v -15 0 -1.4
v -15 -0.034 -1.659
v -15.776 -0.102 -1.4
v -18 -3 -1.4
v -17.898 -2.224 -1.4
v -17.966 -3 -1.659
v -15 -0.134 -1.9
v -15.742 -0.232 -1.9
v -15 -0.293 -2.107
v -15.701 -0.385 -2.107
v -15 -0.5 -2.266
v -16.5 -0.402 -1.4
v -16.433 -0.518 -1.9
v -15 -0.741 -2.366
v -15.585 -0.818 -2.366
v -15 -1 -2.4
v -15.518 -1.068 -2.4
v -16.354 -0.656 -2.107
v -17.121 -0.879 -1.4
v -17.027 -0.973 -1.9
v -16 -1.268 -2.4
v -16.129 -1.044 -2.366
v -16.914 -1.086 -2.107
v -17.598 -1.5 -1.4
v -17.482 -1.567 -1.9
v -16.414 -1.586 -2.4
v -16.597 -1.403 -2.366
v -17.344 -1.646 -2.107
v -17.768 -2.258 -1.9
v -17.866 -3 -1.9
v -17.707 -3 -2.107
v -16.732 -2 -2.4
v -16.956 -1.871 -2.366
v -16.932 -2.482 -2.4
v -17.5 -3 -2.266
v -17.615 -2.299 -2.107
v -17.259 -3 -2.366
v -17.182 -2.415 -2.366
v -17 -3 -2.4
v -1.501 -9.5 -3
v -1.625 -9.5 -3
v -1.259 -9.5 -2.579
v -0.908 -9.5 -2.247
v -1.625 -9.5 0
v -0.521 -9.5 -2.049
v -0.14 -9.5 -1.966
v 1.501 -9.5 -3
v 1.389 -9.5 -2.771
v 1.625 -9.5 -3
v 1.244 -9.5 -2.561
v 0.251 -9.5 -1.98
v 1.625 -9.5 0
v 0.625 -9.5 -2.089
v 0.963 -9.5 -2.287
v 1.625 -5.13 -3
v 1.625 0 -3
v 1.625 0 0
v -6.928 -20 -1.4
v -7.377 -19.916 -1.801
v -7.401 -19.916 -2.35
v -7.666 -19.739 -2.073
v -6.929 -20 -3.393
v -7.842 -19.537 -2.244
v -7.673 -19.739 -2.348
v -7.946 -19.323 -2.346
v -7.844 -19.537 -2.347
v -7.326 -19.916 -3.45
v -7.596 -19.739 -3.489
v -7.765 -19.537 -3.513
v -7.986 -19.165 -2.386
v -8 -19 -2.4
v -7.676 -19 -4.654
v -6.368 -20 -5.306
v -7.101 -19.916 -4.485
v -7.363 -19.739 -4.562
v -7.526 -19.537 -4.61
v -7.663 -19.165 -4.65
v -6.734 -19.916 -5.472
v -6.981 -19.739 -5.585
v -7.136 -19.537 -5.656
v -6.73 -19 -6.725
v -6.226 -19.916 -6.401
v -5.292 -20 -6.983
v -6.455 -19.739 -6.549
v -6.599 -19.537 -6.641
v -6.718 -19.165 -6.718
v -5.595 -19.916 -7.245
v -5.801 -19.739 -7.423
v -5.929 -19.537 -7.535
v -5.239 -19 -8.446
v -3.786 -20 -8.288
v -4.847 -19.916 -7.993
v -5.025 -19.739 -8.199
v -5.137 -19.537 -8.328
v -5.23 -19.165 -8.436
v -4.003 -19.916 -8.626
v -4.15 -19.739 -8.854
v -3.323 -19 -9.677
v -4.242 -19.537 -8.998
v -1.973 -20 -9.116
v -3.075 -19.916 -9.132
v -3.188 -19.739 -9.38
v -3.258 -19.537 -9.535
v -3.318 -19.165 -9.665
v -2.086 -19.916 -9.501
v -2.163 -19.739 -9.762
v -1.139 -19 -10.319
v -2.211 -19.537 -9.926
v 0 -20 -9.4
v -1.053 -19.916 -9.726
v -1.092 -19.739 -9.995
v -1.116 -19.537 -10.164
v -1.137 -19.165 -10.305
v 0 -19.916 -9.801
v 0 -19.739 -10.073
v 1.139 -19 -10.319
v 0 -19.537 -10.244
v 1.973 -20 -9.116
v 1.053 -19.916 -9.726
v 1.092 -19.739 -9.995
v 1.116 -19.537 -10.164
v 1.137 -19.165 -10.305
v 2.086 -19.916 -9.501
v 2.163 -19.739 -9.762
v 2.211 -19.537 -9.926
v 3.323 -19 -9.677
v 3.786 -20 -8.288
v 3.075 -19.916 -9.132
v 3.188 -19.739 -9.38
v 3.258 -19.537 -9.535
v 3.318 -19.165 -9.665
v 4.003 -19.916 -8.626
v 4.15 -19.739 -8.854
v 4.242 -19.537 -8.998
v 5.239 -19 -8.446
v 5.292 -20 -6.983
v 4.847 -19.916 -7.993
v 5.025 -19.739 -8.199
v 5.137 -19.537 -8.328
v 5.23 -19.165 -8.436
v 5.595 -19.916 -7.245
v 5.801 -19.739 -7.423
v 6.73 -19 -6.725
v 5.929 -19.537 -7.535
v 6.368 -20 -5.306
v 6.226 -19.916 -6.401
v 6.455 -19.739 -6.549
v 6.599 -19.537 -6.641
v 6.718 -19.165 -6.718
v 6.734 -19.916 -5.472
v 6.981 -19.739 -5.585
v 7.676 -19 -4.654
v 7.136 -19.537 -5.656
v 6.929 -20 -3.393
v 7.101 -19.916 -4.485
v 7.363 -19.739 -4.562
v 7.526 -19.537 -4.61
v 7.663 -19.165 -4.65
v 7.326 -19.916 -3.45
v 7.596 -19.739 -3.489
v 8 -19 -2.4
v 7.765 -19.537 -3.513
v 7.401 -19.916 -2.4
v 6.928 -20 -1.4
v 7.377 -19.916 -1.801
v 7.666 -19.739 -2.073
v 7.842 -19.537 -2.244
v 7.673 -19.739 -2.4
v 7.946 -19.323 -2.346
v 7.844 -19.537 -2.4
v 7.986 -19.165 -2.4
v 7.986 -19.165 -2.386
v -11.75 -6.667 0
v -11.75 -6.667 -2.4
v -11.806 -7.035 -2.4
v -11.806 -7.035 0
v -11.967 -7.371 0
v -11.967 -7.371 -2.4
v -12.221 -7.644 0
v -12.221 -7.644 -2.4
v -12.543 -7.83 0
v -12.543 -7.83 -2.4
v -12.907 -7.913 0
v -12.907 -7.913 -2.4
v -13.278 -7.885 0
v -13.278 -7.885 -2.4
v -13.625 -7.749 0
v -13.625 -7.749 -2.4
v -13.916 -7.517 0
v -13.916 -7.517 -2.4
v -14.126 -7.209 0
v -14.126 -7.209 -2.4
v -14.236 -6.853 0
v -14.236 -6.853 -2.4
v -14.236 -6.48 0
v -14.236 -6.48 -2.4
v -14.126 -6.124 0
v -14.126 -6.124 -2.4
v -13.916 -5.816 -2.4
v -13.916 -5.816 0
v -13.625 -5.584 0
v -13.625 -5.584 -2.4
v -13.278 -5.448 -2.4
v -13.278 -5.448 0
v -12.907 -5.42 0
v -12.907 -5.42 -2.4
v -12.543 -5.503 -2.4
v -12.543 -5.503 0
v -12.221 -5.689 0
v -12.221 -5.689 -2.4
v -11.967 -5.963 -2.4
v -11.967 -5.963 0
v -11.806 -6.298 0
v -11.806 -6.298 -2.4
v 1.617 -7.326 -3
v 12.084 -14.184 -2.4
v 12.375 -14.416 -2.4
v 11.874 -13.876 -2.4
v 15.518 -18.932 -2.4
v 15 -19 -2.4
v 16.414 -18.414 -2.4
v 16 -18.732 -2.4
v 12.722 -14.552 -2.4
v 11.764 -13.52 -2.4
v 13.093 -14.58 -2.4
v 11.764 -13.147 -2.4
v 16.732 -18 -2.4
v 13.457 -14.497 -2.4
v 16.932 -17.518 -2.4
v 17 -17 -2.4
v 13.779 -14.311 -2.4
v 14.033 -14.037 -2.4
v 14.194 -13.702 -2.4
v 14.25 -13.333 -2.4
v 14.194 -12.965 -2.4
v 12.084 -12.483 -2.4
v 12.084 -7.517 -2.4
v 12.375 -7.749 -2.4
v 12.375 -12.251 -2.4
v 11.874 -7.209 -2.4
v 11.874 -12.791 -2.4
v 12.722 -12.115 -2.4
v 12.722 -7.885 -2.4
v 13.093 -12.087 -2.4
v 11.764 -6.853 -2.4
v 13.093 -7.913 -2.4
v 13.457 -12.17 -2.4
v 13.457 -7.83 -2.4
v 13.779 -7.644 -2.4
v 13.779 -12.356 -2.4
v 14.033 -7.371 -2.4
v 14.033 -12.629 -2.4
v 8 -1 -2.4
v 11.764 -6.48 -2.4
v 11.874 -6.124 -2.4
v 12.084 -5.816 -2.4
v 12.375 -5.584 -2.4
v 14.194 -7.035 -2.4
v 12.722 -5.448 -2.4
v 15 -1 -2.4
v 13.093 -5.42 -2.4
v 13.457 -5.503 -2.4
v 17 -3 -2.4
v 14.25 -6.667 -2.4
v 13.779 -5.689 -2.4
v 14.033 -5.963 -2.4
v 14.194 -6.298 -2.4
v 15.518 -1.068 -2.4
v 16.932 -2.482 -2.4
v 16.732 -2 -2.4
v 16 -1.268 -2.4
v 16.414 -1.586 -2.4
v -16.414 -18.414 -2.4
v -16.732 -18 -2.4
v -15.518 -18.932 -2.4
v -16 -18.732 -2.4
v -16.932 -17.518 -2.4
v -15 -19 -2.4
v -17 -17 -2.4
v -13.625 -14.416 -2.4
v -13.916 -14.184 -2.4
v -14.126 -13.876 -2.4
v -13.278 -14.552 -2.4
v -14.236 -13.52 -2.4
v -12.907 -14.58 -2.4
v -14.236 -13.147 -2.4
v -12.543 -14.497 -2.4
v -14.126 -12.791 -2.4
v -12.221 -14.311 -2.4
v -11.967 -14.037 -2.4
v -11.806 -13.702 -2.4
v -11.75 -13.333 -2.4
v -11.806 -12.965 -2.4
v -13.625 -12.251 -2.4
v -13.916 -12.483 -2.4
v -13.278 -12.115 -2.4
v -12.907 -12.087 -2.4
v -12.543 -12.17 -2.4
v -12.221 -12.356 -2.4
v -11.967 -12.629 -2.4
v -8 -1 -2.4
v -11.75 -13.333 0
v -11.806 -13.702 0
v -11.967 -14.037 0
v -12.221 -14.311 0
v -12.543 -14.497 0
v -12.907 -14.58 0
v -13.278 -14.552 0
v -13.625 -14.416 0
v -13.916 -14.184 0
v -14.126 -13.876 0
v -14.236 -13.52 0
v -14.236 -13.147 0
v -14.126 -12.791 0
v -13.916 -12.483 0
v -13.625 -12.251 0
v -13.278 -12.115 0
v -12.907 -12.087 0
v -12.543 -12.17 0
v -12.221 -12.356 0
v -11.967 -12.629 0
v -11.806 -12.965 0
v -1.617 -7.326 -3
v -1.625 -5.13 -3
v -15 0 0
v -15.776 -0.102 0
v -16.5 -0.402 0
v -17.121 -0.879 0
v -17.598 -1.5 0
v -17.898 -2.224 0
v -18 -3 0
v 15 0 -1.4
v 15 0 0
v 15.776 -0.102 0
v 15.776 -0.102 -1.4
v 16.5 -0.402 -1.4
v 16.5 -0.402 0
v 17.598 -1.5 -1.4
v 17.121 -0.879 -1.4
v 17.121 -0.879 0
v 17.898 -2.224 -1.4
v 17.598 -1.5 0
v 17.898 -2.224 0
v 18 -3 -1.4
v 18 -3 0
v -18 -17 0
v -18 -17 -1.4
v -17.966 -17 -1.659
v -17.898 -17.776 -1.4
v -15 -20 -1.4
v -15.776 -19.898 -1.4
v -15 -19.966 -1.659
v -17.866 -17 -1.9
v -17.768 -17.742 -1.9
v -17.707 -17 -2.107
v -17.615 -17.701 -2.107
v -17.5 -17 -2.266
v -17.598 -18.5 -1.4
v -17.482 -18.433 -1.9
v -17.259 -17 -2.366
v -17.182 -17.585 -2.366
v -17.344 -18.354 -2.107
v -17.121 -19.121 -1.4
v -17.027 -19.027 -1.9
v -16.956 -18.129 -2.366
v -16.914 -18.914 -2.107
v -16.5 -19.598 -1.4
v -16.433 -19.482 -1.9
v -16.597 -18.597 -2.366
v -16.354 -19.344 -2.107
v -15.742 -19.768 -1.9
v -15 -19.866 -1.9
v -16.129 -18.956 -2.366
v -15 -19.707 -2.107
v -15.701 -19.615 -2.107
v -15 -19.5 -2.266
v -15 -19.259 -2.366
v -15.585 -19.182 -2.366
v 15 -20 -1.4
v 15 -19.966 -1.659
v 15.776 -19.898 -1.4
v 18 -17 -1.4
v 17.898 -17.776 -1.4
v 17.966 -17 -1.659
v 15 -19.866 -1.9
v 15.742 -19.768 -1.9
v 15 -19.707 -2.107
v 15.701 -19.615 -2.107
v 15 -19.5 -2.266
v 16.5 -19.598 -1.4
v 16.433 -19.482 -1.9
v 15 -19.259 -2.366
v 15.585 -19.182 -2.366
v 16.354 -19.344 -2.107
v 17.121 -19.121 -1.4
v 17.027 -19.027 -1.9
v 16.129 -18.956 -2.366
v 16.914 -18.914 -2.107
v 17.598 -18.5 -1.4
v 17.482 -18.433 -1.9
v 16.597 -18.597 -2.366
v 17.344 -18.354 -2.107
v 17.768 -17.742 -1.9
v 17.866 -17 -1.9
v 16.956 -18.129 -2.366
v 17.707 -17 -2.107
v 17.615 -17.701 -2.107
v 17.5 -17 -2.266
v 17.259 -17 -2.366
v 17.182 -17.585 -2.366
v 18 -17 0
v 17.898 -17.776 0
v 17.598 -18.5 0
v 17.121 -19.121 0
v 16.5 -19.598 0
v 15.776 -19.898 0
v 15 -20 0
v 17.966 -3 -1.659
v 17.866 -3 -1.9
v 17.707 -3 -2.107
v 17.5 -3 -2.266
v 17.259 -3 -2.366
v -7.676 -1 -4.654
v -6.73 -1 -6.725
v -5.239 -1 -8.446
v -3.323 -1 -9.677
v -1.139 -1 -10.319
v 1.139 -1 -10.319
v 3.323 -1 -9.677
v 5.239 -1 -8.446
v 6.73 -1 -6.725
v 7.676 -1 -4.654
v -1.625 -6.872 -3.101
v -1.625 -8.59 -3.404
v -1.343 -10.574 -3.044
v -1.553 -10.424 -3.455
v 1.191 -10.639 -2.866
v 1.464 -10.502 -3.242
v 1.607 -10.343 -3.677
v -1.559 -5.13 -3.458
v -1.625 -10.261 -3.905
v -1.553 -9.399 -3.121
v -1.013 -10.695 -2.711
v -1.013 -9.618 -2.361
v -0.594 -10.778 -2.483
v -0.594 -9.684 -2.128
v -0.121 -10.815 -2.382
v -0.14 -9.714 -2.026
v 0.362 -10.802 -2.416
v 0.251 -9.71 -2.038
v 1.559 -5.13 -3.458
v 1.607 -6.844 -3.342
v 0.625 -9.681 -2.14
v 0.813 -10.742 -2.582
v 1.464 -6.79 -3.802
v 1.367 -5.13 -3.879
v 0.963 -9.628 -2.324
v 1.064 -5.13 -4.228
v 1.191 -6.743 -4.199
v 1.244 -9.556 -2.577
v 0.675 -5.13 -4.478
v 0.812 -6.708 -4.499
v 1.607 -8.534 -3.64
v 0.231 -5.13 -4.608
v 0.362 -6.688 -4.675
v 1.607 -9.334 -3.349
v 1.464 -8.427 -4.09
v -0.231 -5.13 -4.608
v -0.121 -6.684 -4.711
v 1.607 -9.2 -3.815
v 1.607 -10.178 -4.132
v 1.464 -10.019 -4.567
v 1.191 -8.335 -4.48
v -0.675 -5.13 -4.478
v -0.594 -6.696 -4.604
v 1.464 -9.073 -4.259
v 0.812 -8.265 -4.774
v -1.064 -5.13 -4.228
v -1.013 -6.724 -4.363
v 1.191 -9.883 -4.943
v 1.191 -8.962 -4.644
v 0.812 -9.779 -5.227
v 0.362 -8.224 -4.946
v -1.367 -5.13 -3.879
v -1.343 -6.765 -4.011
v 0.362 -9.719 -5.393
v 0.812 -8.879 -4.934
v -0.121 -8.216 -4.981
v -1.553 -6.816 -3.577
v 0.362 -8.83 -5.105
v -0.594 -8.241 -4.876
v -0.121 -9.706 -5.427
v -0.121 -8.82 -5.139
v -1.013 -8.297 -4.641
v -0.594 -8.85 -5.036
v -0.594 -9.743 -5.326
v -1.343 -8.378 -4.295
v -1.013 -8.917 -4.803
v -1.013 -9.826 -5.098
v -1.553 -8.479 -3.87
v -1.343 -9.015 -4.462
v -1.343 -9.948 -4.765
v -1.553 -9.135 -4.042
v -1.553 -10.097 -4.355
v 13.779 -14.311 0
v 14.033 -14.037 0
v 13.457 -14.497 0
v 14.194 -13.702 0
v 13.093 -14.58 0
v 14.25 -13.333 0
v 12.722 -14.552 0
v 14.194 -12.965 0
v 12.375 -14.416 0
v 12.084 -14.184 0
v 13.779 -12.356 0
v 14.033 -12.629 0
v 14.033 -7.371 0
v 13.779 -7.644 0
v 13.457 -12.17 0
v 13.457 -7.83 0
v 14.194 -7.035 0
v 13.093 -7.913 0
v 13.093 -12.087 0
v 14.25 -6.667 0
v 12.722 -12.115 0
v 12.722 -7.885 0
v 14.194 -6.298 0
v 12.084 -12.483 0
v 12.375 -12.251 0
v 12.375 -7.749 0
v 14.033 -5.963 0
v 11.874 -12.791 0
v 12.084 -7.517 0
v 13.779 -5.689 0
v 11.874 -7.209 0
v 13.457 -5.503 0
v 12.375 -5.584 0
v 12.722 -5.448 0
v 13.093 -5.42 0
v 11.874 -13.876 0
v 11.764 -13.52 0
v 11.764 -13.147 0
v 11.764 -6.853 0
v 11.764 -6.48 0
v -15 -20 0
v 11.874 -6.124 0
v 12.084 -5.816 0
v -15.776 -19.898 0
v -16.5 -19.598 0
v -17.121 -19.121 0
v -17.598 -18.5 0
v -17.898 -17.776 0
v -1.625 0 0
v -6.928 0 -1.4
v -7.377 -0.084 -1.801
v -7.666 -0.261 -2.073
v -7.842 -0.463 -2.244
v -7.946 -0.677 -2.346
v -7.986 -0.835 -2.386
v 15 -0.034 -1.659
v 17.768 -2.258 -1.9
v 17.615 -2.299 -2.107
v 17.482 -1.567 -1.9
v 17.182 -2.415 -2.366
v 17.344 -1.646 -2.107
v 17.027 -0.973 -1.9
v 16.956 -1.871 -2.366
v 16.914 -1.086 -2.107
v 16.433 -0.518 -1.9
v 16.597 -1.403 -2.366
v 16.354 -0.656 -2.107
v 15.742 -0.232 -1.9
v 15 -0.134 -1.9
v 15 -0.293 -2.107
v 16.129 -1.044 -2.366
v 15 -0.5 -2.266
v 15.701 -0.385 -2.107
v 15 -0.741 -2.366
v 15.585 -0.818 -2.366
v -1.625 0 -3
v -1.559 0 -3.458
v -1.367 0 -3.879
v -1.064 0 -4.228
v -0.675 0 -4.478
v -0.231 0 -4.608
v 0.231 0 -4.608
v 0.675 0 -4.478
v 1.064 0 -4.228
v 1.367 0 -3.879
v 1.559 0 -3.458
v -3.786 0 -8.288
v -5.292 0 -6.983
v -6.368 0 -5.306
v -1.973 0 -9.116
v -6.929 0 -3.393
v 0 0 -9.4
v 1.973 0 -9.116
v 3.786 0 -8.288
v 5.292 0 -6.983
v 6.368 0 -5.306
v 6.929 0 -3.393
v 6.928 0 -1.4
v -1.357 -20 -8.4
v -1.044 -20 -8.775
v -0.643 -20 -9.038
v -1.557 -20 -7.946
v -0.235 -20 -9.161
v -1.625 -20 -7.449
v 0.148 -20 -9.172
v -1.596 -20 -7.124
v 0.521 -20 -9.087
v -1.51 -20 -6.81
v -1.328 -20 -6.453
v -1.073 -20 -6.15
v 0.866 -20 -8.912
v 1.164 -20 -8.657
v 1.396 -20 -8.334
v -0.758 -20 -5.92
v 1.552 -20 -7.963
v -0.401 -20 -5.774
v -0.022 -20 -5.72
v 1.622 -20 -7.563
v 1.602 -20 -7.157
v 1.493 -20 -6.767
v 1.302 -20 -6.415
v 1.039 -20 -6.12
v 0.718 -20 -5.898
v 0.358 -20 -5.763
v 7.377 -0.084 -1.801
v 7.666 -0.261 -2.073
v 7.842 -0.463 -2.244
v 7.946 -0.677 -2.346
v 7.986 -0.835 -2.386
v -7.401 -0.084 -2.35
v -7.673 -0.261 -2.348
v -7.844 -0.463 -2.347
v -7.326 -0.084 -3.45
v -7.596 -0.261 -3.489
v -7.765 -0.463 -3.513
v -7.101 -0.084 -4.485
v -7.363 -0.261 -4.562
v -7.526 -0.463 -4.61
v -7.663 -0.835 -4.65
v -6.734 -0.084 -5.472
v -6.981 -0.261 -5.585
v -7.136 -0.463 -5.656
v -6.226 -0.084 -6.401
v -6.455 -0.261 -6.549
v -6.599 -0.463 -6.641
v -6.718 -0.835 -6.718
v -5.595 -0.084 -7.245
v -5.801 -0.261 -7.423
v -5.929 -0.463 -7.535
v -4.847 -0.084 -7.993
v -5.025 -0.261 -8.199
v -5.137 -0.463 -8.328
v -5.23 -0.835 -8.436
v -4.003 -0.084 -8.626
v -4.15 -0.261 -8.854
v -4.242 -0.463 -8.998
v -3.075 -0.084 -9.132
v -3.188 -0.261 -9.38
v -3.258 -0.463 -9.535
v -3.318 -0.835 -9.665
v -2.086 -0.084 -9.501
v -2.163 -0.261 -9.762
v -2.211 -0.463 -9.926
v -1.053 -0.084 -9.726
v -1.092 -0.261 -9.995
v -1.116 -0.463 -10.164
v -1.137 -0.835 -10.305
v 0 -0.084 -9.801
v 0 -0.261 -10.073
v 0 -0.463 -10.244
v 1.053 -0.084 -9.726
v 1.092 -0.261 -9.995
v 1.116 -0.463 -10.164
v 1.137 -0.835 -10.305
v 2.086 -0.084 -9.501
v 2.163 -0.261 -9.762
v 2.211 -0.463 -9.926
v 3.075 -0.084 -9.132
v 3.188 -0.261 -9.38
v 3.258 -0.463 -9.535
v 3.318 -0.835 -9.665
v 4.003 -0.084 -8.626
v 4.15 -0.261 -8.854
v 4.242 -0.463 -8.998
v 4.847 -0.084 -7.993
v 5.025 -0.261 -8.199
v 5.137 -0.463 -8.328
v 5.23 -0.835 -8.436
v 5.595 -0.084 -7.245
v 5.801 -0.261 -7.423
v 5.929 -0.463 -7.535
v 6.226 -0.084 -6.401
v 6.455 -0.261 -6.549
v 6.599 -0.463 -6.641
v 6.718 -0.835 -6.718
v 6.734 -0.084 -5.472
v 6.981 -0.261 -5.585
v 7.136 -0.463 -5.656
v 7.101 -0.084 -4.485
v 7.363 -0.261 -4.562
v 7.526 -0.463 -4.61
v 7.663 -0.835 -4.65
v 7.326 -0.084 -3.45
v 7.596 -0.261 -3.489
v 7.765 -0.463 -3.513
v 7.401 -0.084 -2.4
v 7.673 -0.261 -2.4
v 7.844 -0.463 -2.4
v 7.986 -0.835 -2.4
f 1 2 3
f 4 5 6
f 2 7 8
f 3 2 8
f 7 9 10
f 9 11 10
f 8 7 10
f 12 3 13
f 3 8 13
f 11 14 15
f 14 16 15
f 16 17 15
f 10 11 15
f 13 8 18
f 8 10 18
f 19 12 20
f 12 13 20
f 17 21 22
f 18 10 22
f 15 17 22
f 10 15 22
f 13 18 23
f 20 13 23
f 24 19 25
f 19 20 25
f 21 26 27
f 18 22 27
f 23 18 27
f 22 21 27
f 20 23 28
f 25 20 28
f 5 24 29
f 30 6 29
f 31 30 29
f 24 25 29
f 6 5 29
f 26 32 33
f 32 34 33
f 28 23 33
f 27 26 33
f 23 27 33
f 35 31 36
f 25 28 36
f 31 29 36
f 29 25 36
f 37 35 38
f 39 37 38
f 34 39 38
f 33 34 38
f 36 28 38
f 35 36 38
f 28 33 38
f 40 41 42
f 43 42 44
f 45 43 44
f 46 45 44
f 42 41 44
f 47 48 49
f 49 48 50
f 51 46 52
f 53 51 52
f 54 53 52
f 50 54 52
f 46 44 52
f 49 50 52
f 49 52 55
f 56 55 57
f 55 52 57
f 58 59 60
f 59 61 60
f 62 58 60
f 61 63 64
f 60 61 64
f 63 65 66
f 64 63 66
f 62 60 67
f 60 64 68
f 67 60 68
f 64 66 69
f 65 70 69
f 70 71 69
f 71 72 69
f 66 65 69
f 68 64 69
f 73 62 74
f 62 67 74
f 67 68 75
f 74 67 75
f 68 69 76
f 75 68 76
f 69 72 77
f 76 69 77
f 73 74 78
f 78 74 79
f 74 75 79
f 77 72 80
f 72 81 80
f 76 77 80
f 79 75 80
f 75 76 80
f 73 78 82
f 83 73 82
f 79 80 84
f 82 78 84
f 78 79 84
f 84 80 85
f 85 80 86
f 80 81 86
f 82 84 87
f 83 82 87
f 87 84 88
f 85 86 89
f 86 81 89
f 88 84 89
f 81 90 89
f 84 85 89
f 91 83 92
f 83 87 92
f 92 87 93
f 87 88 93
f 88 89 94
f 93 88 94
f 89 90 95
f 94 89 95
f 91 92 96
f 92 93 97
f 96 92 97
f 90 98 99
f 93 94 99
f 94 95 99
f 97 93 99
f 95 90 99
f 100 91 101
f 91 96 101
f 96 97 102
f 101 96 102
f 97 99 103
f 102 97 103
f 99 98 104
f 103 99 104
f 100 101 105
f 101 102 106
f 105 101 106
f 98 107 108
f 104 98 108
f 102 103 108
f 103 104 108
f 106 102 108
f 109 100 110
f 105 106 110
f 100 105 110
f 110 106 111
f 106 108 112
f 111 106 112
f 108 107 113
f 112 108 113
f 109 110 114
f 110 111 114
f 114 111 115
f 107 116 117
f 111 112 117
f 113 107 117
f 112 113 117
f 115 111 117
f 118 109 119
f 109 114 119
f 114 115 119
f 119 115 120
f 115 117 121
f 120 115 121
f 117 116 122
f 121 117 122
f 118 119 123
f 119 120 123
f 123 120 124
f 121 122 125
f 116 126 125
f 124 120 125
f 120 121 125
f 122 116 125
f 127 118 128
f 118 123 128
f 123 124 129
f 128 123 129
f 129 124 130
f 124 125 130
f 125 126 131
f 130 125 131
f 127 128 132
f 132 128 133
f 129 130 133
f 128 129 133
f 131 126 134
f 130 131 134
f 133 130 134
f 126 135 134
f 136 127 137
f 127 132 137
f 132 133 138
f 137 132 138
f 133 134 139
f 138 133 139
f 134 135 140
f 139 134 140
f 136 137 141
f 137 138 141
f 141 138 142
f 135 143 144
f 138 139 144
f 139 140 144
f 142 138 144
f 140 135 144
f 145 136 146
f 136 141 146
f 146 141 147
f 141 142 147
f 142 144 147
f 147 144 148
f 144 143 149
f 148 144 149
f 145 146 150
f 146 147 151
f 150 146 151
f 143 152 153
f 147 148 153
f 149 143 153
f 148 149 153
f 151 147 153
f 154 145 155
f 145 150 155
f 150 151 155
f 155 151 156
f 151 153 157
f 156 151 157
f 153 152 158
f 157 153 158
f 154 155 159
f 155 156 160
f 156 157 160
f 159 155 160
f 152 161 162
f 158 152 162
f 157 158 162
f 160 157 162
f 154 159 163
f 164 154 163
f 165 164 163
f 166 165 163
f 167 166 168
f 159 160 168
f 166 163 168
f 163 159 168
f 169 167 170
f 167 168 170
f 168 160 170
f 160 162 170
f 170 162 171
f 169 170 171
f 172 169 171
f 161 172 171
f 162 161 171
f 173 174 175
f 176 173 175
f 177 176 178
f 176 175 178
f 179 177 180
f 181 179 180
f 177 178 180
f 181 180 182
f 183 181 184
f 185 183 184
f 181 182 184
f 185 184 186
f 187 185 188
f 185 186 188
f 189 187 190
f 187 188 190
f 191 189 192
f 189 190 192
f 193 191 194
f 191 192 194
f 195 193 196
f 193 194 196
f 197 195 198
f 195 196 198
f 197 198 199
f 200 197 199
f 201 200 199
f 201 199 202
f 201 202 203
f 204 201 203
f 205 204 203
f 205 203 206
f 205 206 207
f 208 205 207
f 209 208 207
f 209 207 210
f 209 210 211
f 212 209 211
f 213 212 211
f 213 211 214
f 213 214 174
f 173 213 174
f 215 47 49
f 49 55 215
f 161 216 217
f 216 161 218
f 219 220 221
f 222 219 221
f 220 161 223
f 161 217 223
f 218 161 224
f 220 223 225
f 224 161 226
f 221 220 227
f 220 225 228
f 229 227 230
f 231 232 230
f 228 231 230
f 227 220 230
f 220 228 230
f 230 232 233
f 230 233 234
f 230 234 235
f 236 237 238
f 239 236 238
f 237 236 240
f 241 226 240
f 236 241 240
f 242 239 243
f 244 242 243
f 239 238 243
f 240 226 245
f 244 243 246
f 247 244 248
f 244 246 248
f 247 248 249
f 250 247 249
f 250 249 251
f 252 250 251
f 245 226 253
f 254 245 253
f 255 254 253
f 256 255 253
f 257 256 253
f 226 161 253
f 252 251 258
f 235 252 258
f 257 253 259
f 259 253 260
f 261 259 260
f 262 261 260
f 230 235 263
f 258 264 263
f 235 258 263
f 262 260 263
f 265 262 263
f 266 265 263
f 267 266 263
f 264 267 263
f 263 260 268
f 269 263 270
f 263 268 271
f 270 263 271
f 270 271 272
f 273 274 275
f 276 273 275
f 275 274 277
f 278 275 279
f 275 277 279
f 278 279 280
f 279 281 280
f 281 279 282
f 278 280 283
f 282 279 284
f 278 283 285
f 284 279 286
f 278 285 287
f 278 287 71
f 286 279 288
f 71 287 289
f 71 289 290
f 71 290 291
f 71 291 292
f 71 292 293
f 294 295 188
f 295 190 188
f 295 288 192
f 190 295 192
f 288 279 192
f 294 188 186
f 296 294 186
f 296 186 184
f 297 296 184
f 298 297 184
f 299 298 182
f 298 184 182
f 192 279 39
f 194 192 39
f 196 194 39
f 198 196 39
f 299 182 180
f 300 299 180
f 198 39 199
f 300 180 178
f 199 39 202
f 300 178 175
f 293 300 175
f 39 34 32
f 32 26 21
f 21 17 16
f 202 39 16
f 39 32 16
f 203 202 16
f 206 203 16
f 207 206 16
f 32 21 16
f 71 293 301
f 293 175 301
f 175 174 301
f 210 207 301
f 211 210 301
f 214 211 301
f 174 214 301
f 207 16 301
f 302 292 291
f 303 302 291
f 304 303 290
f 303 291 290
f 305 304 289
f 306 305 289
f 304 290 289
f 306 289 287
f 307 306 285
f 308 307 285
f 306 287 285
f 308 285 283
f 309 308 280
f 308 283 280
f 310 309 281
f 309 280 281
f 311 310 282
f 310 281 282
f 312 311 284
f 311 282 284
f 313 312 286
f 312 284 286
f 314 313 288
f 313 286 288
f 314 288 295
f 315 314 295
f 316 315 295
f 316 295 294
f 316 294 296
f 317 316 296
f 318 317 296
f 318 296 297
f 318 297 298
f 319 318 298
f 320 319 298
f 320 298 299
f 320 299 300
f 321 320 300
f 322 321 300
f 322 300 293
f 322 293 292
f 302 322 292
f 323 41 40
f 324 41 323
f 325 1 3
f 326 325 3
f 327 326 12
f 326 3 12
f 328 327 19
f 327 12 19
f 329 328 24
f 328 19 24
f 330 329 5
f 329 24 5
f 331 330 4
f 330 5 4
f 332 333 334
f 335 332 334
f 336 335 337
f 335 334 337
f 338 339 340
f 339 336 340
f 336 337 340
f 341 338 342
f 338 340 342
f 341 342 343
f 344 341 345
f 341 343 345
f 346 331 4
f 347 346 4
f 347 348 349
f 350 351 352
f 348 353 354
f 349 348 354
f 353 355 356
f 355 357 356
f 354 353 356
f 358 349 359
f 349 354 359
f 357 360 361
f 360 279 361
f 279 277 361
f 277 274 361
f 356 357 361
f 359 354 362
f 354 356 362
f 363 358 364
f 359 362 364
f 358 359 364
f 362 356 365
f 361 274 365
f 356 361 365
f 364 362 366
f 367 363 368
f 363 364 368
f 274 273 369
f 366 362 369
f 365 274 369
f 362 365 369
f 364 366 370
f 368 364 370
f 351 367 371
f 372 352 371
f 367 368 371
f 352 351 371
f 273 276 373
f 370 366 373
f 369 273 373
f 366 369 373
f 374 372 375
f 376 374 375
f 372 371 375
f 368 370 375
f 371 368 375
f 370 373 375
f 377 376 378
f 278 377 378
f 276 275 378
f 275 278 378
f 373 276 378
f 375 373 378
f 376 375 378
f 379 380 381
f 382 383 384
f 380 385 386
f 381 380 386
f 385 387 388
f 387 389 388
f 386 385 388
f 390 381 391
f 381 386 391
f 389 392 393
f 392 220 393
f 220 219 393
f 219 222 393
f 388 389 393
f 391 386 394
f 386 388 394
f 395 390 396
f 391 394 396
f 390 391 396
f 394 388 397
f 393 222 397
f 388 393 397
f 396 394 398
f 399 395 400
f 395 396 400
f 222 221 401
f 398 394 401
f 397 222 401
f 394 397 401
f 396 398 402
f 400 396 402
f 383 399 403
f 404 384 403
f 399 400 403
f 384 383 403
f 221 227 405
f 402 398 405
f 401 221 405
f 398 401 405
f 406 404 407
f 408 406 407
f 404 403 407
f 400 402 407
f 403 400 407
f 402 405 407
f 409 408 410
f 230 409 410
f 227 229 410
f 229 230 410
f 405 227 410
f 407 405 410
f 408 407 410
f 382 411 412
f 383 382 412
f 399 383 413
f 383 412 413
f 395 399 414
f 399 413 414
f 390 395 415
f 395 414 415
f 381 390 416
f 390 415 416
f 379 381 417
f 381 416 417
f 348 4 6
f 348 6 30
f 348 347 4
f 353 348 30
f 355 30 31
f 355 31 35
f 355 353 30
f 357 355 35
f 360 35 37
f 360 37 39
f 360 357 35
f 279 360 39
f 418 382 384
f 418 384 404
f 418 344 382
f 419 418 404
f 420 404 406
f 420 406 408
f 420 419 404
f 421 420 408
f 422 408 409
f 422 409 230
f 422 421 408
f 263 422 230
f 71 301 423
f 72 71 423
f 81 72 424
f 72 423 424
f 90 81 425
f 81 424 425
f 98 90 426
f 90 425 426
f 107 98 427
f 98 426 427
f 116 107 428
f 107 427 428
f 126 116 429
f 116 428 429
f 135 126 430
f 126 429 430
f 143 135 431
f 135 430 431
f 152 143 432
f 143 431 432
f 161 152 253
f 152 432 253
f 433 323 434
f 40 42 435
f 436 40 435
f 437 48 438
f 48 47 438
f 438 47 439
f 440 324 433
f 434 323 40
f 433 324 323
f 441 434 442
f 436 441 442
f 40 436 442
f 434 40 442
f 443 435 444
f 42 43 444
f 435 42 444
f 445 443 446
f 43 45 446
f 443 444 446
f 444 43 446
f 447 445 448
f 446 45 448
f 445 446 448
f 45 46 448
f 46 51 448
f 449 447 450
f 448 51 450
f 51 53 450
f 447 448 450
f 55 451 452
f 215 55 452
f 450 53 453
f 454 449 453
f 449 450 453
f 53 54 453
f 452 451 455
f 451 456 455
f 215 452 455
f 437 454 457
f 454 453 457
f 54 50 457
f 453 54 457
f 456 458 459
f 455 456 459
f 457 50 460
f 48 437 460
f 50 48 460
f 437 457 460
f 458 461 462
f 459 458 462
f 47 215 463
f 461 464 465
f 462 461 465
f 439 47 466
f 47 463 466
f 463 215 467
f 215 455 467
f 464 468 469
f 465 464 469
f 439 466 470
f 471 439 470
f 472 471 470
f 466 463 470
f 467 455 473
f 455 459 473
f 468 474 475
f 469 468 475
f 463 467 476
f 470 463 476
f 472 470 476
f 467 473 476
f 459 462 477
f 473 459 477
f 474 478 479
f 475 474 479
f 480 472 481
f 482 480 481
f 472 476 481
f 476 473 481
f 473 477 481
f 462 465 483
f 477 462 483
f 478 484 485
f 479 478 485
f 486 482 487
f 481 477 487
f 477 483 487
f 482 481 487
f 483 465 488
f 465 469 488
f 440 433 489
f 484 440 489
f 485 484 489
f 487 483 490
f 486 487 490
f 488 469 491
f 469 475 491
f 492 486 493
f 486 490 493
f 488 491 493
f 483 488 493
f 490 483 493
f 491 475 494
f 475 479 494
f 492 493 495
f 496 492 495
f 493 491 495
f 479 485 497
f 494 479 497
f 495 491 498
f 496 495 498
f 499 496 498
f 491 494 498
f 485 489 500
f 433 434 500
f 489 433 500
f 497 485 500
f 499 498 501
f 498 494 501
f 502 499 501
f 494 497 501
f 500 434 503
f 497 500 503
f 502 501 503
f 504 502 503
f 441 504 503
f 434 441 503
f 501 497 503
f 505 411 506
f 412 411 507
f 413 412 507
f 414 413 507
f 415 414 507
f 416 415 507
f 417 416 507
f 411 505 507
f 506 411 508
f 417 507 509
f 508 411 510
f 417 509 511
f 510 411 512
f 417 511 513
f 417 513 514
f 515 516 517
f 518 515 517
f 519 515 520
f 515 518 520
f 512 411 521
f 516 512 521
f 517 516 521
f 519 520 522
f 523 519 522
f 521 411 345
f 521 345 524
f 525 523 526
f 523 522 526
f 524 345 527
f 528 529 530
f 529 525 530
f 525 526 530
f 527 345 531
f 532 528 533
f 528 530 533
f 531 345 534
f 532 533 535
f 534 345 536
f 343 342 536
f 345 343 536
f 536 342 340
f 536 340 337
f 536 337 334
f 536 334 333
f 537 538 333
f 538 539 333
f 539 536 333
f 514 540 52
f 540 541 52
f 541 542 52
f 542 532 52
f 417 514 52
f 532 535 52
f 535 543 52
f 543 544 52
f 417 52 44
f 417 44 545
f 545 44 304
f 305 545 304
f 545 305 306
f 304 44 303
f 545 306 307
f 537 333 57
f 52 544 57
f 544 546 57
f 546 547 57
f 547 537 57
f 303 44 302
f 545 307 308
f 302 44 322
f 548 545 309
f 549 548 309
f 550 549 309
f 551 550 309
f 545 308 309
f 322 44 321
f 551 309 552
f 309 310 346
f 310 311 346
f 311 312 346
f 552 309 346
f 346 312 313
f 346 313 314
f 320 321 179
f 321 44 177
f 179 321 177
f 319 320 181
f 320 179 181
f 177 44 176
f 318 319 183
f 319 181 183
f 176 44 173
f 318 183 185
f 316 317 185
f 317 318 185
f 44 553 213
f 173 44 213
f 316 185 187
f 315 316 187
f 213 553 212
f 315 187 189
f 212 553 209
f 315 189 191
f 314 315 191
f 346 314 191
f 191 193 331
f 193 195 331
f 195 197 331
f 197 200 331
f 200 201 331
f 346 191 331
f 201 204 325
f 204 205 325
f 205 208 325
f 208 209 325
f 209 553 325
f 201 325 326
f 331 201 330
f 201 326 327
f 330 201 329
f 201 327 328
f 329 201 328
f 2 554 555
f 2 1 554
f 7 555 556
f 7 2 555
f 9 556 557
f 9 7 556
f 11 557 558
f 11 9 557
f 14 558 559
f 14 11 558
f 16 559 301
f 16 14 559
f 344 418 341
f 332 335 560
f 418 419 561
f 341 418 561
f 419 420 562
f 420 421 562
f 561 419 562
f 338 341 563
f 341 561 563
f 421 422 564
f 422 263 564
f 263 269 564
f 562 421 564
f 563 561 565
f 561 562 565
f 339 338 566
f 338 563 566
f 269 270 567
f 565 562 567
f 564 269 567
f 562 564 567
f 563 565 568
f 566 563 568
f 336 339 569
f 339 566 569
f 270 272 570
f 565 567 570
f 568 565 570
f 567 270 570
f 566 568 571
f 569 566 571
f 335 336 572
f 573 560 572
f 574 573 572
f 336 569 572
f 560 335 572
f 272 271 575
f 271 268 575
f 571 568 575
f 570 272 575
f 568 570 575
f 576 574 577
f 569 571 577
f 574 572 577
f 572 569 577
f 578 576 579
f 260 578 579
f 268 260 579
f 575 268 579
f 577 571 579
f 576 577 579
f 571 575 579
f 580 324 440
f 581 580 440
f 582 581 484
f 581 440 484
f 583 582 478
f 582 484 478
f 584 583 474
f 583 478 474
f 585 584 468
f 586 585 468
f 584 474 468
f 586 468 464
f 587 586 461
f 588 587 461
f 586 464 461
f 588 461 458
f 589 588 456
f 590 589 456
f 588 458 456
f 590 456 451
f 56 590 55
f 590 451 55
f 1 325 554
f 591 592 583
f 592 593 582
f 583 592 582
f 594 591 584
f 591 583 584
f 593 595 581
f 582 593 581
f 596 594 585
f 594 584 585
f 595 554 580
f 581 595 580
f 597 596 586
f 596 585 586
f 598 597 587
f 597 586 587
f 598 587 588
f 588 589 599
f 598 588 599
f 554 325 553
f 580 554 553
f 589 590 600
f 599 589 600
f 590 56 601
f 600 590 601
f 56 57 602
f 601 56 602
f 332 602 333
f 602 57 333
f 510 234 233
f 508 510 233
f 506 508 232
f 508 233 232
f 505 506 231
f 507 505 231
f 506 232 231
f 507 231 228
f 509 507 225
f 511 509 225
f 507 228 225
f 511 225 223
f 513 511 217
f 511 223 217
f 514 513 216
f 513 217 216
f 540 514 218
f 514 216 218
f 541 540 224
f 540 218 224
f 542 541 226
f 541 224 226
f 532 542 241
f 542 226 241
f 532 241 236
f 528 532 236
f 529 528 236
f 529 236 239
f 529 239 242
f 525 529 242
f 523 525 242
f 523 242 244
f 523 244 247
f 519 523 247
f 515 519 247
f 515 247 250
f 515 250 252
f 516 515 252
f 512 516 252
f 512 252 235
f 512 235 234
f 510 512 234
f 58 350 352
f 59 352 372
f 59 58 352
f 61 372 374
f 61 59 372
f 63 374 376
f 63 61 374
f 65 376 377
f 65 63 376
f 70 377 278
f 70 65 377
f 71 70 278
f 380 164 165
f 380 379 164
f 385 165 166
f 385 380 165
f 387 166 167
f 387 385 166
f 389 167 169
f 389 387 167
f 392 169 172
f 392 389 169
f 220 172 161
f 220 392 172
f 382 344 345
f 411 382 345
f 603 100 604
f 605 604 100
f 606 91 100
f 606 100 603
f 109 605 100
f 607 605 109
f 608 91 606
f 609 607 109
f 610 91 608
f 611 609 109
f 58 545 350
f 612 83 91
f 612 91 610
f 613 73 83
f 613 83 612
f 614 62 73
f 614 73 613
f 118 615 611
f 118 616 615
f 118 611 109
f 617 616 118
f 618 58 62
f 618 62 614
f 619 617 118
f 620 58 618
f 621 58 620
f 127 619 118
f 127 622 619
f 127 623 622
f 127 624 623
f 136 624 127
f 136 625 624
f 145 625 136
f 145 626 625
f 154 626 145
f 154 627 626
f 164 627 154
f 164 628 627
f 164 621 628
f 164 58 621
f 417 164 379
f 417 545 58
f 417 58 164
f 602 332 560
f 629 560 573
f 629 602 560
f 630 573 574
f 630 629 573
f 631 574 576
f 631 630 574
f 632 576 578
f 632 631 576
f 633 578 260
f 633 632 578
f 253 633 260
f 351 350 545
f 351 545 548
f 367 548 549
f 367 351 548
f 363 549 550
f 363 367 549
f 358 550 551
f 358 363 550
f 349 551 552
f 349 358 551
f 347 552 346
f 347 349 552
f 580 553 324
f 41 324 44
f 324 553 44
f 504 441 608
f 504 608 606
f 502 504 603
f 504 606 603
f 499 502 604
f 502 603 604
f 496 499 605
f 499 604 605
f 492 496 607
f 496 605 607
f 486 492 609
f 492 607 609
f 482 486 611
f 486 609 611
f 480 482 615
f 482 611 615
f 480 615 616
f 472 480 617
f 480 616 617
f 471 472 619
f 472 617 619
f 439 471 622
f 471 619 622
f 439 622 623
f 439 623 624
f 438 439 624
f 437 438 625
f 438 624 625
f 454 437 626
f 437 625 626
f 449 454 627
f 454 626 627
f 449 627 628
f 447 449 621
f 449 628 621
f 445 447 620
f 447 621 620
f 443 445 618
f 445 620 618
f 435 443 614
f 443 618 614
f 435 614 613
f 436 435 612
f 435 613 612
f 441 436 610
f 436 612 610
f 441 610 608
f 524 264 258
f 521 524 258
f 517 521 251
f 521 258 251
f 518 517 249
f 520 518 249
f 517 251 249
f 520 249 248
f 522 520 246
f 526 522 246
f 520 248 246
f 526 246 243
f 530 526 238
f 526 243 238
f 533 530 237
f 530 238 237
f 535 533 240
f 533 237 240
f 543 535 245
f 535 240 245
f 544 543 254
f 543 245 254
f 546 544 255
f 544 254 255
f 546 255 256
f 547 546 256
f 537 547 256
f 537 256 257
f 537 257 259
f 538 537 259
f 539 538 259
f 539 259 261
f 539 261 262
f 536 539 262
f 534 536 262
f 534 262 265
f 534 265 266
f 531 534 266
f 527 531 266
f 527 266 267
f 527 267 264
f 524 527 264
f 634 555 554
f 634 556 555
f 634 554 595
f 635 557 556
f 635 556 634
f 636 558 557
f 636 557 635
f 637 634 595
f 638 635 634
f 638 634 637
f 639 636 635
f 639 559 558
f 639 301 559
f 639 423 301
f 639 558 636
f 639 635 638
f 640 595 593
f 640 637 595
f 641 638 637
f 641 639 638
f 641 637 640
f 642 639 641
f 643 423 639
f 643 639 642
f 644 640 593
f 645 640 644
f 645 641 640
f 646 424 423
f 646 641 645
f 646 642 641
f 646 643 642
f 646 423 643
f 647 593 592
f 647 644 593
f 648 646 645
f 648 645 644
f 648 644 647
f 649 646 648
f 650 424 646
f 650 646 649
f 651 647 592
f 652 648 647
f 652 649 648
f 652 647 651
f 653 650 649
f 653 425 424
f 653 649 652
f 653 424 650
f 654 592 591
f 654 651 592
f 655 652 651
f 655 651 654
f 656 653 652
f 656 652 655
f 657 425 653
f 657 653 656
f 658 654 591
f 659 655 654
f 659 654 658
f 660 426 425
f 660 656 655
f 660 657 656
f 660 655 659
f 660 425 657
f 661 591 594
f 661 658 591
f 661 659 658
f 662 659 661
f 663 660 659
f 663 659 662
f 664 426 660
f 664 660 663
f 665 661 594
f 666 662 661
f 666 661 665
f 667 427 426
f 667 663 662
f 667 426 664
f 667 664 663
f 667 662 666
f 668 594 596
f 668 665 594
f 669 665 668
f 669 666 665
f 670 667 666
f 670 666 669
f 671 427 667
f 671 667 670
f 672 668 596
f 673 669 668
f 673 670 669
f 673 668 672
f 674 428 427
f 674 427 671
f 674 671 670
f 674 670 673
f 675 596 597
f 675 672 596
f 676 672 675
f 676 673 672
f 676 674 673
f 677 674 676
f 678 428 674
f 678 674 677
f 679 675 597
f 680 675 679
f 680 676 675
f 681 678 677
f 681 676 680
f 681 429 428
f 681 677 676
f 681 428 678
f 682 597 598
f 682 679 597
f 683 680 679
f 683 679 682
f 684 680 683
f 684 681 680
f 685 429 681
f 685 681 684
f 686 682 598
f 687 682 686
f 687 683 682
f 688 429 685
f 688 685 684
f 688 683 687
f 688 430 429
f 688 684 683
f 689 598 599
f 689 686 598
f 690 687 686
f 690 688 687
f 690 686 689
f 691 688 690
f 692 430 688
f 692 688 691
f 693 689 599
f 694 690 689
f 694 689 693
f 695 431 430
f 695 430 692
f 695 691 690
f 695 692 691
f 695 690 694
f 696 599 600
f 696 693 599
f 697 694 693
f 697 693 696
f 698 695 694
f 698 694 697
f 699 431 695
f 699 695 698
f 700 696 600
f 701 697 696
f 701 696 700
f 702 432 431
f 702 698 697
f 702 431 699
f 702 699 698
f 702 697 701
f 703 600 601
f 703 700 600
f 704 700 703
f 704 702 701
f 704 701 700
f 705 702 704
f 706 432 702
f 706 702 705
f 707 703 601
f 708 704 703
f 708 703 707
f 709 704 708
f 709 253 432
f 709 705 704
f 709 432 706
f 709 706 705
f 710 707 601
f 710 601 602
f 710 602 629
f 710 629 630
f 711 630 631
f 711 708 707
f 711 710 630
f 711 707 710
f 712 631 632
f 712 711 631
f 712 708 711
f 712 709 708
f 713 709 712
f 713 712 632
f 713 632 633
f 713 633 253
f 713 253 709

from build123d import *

# Parameters (mm, degrees)
F2_DEPTH = 20
F4_R     = 1.625
F7_DEPTH = 3
F8_R     = 1.25
F9_DEPTH = 2.4010001
F10_R    = 3
F11_R    = 1


with BuildPart() as f2:
    # F1 (on Front) → F2 (new body)
    with BuildSketch(Plane.XZ):
        with BuildLine():
            Line((18, 0), (0, 0))
            Line((0, 0), (-18, 0))
            Line((-18, 0), (-18, -2.4))
            Line((-18, -2.4), (-8, -2.4))
            ThreePointArc((-8, -2.4), (0, -10.4), (8, -2.4))
            Line((8, -2.4), (18, -2.4))
            Line((18, -2.4), (18, 0))
        make_face()
    extrude(amount=F2_DEPTH)

    # F5: sweep along a path in F3
    with BuildLine(Plane.YZ) as f5_path:
        Line((0, -3), (-5.1303021499, -3))
        ThreePointArc((-5.1303021499, -3), (-7.7350248149, -3.2278837048), (-10.2606042998, -3.9046106882))
        Line((-10.2606042998, -3.9046106882), (-24.8597601286, -9.2182688553))
    # F4 (on face) → F5 (sweep, cut)
    with BuildSketch(Plane(origin=(0, 0, 0), x_dir=(-1, 0, 0), z_dir=(0, 1, 0))):
        with Locations((0, -3)):
            Circle(F4_R)
    sweep(path=f5_path.line, mode=Mode.SUBTRACT)

    # F6 (on face) → F7 (cut)
    with BuildSketch(Plane.XY):
        Polygon((1.625, -9.5), (1.625, -5.1303021499), (1.625, 0), (-1.625, 0), (-1.625, -5.1303021499), (-1.625, -9.5), align=None)
    extrude(amount=-F7_DEPTH, mode=Mode.SUBTRACT)

    # F8 (on face) → F9 (cut, through all)
    with BuildSketch(Plane(origin=(0, 0, -2.4), x_dir=(1, 0, 0), z_dir=(0, 0, -1))):
        with Locations((13, 13.3333333333)):
            Circle(F8_R)
        with Locations((13, 6.6666666667)):
            Circle(F8_R)
        with Locations((-13, 13.3333333333)):
            Circle(F8_R)
        with Locations((-13, 6.6666666667)):
            Circle(F8_R)
    extrude(amount=-F9_DEPTH, mode=Mode.SUBTRACT)

    # F10
    f10_edges = [f2.edges().sort_by_distance(p)[0] for p in [
        (18, -20, -1.2),
        (18, 0, -1.2),
        (-18, -20, -1.2),
        (-18, 0, -1.2),
    ]]
    fillet(f10_edges, radius=F10_R)

    # F11
    f11_edges = [f2.edges().sort_by_distance(p)[0] for p in [
        (0, -20, -10.4),
        (-11.5, -20, -2.4),
        (11.5, -20, -2.4),
        (0, 0, -10.4),
    ]]
    fillet(f11_edges, radius=F11_R)


solid = f2.part
